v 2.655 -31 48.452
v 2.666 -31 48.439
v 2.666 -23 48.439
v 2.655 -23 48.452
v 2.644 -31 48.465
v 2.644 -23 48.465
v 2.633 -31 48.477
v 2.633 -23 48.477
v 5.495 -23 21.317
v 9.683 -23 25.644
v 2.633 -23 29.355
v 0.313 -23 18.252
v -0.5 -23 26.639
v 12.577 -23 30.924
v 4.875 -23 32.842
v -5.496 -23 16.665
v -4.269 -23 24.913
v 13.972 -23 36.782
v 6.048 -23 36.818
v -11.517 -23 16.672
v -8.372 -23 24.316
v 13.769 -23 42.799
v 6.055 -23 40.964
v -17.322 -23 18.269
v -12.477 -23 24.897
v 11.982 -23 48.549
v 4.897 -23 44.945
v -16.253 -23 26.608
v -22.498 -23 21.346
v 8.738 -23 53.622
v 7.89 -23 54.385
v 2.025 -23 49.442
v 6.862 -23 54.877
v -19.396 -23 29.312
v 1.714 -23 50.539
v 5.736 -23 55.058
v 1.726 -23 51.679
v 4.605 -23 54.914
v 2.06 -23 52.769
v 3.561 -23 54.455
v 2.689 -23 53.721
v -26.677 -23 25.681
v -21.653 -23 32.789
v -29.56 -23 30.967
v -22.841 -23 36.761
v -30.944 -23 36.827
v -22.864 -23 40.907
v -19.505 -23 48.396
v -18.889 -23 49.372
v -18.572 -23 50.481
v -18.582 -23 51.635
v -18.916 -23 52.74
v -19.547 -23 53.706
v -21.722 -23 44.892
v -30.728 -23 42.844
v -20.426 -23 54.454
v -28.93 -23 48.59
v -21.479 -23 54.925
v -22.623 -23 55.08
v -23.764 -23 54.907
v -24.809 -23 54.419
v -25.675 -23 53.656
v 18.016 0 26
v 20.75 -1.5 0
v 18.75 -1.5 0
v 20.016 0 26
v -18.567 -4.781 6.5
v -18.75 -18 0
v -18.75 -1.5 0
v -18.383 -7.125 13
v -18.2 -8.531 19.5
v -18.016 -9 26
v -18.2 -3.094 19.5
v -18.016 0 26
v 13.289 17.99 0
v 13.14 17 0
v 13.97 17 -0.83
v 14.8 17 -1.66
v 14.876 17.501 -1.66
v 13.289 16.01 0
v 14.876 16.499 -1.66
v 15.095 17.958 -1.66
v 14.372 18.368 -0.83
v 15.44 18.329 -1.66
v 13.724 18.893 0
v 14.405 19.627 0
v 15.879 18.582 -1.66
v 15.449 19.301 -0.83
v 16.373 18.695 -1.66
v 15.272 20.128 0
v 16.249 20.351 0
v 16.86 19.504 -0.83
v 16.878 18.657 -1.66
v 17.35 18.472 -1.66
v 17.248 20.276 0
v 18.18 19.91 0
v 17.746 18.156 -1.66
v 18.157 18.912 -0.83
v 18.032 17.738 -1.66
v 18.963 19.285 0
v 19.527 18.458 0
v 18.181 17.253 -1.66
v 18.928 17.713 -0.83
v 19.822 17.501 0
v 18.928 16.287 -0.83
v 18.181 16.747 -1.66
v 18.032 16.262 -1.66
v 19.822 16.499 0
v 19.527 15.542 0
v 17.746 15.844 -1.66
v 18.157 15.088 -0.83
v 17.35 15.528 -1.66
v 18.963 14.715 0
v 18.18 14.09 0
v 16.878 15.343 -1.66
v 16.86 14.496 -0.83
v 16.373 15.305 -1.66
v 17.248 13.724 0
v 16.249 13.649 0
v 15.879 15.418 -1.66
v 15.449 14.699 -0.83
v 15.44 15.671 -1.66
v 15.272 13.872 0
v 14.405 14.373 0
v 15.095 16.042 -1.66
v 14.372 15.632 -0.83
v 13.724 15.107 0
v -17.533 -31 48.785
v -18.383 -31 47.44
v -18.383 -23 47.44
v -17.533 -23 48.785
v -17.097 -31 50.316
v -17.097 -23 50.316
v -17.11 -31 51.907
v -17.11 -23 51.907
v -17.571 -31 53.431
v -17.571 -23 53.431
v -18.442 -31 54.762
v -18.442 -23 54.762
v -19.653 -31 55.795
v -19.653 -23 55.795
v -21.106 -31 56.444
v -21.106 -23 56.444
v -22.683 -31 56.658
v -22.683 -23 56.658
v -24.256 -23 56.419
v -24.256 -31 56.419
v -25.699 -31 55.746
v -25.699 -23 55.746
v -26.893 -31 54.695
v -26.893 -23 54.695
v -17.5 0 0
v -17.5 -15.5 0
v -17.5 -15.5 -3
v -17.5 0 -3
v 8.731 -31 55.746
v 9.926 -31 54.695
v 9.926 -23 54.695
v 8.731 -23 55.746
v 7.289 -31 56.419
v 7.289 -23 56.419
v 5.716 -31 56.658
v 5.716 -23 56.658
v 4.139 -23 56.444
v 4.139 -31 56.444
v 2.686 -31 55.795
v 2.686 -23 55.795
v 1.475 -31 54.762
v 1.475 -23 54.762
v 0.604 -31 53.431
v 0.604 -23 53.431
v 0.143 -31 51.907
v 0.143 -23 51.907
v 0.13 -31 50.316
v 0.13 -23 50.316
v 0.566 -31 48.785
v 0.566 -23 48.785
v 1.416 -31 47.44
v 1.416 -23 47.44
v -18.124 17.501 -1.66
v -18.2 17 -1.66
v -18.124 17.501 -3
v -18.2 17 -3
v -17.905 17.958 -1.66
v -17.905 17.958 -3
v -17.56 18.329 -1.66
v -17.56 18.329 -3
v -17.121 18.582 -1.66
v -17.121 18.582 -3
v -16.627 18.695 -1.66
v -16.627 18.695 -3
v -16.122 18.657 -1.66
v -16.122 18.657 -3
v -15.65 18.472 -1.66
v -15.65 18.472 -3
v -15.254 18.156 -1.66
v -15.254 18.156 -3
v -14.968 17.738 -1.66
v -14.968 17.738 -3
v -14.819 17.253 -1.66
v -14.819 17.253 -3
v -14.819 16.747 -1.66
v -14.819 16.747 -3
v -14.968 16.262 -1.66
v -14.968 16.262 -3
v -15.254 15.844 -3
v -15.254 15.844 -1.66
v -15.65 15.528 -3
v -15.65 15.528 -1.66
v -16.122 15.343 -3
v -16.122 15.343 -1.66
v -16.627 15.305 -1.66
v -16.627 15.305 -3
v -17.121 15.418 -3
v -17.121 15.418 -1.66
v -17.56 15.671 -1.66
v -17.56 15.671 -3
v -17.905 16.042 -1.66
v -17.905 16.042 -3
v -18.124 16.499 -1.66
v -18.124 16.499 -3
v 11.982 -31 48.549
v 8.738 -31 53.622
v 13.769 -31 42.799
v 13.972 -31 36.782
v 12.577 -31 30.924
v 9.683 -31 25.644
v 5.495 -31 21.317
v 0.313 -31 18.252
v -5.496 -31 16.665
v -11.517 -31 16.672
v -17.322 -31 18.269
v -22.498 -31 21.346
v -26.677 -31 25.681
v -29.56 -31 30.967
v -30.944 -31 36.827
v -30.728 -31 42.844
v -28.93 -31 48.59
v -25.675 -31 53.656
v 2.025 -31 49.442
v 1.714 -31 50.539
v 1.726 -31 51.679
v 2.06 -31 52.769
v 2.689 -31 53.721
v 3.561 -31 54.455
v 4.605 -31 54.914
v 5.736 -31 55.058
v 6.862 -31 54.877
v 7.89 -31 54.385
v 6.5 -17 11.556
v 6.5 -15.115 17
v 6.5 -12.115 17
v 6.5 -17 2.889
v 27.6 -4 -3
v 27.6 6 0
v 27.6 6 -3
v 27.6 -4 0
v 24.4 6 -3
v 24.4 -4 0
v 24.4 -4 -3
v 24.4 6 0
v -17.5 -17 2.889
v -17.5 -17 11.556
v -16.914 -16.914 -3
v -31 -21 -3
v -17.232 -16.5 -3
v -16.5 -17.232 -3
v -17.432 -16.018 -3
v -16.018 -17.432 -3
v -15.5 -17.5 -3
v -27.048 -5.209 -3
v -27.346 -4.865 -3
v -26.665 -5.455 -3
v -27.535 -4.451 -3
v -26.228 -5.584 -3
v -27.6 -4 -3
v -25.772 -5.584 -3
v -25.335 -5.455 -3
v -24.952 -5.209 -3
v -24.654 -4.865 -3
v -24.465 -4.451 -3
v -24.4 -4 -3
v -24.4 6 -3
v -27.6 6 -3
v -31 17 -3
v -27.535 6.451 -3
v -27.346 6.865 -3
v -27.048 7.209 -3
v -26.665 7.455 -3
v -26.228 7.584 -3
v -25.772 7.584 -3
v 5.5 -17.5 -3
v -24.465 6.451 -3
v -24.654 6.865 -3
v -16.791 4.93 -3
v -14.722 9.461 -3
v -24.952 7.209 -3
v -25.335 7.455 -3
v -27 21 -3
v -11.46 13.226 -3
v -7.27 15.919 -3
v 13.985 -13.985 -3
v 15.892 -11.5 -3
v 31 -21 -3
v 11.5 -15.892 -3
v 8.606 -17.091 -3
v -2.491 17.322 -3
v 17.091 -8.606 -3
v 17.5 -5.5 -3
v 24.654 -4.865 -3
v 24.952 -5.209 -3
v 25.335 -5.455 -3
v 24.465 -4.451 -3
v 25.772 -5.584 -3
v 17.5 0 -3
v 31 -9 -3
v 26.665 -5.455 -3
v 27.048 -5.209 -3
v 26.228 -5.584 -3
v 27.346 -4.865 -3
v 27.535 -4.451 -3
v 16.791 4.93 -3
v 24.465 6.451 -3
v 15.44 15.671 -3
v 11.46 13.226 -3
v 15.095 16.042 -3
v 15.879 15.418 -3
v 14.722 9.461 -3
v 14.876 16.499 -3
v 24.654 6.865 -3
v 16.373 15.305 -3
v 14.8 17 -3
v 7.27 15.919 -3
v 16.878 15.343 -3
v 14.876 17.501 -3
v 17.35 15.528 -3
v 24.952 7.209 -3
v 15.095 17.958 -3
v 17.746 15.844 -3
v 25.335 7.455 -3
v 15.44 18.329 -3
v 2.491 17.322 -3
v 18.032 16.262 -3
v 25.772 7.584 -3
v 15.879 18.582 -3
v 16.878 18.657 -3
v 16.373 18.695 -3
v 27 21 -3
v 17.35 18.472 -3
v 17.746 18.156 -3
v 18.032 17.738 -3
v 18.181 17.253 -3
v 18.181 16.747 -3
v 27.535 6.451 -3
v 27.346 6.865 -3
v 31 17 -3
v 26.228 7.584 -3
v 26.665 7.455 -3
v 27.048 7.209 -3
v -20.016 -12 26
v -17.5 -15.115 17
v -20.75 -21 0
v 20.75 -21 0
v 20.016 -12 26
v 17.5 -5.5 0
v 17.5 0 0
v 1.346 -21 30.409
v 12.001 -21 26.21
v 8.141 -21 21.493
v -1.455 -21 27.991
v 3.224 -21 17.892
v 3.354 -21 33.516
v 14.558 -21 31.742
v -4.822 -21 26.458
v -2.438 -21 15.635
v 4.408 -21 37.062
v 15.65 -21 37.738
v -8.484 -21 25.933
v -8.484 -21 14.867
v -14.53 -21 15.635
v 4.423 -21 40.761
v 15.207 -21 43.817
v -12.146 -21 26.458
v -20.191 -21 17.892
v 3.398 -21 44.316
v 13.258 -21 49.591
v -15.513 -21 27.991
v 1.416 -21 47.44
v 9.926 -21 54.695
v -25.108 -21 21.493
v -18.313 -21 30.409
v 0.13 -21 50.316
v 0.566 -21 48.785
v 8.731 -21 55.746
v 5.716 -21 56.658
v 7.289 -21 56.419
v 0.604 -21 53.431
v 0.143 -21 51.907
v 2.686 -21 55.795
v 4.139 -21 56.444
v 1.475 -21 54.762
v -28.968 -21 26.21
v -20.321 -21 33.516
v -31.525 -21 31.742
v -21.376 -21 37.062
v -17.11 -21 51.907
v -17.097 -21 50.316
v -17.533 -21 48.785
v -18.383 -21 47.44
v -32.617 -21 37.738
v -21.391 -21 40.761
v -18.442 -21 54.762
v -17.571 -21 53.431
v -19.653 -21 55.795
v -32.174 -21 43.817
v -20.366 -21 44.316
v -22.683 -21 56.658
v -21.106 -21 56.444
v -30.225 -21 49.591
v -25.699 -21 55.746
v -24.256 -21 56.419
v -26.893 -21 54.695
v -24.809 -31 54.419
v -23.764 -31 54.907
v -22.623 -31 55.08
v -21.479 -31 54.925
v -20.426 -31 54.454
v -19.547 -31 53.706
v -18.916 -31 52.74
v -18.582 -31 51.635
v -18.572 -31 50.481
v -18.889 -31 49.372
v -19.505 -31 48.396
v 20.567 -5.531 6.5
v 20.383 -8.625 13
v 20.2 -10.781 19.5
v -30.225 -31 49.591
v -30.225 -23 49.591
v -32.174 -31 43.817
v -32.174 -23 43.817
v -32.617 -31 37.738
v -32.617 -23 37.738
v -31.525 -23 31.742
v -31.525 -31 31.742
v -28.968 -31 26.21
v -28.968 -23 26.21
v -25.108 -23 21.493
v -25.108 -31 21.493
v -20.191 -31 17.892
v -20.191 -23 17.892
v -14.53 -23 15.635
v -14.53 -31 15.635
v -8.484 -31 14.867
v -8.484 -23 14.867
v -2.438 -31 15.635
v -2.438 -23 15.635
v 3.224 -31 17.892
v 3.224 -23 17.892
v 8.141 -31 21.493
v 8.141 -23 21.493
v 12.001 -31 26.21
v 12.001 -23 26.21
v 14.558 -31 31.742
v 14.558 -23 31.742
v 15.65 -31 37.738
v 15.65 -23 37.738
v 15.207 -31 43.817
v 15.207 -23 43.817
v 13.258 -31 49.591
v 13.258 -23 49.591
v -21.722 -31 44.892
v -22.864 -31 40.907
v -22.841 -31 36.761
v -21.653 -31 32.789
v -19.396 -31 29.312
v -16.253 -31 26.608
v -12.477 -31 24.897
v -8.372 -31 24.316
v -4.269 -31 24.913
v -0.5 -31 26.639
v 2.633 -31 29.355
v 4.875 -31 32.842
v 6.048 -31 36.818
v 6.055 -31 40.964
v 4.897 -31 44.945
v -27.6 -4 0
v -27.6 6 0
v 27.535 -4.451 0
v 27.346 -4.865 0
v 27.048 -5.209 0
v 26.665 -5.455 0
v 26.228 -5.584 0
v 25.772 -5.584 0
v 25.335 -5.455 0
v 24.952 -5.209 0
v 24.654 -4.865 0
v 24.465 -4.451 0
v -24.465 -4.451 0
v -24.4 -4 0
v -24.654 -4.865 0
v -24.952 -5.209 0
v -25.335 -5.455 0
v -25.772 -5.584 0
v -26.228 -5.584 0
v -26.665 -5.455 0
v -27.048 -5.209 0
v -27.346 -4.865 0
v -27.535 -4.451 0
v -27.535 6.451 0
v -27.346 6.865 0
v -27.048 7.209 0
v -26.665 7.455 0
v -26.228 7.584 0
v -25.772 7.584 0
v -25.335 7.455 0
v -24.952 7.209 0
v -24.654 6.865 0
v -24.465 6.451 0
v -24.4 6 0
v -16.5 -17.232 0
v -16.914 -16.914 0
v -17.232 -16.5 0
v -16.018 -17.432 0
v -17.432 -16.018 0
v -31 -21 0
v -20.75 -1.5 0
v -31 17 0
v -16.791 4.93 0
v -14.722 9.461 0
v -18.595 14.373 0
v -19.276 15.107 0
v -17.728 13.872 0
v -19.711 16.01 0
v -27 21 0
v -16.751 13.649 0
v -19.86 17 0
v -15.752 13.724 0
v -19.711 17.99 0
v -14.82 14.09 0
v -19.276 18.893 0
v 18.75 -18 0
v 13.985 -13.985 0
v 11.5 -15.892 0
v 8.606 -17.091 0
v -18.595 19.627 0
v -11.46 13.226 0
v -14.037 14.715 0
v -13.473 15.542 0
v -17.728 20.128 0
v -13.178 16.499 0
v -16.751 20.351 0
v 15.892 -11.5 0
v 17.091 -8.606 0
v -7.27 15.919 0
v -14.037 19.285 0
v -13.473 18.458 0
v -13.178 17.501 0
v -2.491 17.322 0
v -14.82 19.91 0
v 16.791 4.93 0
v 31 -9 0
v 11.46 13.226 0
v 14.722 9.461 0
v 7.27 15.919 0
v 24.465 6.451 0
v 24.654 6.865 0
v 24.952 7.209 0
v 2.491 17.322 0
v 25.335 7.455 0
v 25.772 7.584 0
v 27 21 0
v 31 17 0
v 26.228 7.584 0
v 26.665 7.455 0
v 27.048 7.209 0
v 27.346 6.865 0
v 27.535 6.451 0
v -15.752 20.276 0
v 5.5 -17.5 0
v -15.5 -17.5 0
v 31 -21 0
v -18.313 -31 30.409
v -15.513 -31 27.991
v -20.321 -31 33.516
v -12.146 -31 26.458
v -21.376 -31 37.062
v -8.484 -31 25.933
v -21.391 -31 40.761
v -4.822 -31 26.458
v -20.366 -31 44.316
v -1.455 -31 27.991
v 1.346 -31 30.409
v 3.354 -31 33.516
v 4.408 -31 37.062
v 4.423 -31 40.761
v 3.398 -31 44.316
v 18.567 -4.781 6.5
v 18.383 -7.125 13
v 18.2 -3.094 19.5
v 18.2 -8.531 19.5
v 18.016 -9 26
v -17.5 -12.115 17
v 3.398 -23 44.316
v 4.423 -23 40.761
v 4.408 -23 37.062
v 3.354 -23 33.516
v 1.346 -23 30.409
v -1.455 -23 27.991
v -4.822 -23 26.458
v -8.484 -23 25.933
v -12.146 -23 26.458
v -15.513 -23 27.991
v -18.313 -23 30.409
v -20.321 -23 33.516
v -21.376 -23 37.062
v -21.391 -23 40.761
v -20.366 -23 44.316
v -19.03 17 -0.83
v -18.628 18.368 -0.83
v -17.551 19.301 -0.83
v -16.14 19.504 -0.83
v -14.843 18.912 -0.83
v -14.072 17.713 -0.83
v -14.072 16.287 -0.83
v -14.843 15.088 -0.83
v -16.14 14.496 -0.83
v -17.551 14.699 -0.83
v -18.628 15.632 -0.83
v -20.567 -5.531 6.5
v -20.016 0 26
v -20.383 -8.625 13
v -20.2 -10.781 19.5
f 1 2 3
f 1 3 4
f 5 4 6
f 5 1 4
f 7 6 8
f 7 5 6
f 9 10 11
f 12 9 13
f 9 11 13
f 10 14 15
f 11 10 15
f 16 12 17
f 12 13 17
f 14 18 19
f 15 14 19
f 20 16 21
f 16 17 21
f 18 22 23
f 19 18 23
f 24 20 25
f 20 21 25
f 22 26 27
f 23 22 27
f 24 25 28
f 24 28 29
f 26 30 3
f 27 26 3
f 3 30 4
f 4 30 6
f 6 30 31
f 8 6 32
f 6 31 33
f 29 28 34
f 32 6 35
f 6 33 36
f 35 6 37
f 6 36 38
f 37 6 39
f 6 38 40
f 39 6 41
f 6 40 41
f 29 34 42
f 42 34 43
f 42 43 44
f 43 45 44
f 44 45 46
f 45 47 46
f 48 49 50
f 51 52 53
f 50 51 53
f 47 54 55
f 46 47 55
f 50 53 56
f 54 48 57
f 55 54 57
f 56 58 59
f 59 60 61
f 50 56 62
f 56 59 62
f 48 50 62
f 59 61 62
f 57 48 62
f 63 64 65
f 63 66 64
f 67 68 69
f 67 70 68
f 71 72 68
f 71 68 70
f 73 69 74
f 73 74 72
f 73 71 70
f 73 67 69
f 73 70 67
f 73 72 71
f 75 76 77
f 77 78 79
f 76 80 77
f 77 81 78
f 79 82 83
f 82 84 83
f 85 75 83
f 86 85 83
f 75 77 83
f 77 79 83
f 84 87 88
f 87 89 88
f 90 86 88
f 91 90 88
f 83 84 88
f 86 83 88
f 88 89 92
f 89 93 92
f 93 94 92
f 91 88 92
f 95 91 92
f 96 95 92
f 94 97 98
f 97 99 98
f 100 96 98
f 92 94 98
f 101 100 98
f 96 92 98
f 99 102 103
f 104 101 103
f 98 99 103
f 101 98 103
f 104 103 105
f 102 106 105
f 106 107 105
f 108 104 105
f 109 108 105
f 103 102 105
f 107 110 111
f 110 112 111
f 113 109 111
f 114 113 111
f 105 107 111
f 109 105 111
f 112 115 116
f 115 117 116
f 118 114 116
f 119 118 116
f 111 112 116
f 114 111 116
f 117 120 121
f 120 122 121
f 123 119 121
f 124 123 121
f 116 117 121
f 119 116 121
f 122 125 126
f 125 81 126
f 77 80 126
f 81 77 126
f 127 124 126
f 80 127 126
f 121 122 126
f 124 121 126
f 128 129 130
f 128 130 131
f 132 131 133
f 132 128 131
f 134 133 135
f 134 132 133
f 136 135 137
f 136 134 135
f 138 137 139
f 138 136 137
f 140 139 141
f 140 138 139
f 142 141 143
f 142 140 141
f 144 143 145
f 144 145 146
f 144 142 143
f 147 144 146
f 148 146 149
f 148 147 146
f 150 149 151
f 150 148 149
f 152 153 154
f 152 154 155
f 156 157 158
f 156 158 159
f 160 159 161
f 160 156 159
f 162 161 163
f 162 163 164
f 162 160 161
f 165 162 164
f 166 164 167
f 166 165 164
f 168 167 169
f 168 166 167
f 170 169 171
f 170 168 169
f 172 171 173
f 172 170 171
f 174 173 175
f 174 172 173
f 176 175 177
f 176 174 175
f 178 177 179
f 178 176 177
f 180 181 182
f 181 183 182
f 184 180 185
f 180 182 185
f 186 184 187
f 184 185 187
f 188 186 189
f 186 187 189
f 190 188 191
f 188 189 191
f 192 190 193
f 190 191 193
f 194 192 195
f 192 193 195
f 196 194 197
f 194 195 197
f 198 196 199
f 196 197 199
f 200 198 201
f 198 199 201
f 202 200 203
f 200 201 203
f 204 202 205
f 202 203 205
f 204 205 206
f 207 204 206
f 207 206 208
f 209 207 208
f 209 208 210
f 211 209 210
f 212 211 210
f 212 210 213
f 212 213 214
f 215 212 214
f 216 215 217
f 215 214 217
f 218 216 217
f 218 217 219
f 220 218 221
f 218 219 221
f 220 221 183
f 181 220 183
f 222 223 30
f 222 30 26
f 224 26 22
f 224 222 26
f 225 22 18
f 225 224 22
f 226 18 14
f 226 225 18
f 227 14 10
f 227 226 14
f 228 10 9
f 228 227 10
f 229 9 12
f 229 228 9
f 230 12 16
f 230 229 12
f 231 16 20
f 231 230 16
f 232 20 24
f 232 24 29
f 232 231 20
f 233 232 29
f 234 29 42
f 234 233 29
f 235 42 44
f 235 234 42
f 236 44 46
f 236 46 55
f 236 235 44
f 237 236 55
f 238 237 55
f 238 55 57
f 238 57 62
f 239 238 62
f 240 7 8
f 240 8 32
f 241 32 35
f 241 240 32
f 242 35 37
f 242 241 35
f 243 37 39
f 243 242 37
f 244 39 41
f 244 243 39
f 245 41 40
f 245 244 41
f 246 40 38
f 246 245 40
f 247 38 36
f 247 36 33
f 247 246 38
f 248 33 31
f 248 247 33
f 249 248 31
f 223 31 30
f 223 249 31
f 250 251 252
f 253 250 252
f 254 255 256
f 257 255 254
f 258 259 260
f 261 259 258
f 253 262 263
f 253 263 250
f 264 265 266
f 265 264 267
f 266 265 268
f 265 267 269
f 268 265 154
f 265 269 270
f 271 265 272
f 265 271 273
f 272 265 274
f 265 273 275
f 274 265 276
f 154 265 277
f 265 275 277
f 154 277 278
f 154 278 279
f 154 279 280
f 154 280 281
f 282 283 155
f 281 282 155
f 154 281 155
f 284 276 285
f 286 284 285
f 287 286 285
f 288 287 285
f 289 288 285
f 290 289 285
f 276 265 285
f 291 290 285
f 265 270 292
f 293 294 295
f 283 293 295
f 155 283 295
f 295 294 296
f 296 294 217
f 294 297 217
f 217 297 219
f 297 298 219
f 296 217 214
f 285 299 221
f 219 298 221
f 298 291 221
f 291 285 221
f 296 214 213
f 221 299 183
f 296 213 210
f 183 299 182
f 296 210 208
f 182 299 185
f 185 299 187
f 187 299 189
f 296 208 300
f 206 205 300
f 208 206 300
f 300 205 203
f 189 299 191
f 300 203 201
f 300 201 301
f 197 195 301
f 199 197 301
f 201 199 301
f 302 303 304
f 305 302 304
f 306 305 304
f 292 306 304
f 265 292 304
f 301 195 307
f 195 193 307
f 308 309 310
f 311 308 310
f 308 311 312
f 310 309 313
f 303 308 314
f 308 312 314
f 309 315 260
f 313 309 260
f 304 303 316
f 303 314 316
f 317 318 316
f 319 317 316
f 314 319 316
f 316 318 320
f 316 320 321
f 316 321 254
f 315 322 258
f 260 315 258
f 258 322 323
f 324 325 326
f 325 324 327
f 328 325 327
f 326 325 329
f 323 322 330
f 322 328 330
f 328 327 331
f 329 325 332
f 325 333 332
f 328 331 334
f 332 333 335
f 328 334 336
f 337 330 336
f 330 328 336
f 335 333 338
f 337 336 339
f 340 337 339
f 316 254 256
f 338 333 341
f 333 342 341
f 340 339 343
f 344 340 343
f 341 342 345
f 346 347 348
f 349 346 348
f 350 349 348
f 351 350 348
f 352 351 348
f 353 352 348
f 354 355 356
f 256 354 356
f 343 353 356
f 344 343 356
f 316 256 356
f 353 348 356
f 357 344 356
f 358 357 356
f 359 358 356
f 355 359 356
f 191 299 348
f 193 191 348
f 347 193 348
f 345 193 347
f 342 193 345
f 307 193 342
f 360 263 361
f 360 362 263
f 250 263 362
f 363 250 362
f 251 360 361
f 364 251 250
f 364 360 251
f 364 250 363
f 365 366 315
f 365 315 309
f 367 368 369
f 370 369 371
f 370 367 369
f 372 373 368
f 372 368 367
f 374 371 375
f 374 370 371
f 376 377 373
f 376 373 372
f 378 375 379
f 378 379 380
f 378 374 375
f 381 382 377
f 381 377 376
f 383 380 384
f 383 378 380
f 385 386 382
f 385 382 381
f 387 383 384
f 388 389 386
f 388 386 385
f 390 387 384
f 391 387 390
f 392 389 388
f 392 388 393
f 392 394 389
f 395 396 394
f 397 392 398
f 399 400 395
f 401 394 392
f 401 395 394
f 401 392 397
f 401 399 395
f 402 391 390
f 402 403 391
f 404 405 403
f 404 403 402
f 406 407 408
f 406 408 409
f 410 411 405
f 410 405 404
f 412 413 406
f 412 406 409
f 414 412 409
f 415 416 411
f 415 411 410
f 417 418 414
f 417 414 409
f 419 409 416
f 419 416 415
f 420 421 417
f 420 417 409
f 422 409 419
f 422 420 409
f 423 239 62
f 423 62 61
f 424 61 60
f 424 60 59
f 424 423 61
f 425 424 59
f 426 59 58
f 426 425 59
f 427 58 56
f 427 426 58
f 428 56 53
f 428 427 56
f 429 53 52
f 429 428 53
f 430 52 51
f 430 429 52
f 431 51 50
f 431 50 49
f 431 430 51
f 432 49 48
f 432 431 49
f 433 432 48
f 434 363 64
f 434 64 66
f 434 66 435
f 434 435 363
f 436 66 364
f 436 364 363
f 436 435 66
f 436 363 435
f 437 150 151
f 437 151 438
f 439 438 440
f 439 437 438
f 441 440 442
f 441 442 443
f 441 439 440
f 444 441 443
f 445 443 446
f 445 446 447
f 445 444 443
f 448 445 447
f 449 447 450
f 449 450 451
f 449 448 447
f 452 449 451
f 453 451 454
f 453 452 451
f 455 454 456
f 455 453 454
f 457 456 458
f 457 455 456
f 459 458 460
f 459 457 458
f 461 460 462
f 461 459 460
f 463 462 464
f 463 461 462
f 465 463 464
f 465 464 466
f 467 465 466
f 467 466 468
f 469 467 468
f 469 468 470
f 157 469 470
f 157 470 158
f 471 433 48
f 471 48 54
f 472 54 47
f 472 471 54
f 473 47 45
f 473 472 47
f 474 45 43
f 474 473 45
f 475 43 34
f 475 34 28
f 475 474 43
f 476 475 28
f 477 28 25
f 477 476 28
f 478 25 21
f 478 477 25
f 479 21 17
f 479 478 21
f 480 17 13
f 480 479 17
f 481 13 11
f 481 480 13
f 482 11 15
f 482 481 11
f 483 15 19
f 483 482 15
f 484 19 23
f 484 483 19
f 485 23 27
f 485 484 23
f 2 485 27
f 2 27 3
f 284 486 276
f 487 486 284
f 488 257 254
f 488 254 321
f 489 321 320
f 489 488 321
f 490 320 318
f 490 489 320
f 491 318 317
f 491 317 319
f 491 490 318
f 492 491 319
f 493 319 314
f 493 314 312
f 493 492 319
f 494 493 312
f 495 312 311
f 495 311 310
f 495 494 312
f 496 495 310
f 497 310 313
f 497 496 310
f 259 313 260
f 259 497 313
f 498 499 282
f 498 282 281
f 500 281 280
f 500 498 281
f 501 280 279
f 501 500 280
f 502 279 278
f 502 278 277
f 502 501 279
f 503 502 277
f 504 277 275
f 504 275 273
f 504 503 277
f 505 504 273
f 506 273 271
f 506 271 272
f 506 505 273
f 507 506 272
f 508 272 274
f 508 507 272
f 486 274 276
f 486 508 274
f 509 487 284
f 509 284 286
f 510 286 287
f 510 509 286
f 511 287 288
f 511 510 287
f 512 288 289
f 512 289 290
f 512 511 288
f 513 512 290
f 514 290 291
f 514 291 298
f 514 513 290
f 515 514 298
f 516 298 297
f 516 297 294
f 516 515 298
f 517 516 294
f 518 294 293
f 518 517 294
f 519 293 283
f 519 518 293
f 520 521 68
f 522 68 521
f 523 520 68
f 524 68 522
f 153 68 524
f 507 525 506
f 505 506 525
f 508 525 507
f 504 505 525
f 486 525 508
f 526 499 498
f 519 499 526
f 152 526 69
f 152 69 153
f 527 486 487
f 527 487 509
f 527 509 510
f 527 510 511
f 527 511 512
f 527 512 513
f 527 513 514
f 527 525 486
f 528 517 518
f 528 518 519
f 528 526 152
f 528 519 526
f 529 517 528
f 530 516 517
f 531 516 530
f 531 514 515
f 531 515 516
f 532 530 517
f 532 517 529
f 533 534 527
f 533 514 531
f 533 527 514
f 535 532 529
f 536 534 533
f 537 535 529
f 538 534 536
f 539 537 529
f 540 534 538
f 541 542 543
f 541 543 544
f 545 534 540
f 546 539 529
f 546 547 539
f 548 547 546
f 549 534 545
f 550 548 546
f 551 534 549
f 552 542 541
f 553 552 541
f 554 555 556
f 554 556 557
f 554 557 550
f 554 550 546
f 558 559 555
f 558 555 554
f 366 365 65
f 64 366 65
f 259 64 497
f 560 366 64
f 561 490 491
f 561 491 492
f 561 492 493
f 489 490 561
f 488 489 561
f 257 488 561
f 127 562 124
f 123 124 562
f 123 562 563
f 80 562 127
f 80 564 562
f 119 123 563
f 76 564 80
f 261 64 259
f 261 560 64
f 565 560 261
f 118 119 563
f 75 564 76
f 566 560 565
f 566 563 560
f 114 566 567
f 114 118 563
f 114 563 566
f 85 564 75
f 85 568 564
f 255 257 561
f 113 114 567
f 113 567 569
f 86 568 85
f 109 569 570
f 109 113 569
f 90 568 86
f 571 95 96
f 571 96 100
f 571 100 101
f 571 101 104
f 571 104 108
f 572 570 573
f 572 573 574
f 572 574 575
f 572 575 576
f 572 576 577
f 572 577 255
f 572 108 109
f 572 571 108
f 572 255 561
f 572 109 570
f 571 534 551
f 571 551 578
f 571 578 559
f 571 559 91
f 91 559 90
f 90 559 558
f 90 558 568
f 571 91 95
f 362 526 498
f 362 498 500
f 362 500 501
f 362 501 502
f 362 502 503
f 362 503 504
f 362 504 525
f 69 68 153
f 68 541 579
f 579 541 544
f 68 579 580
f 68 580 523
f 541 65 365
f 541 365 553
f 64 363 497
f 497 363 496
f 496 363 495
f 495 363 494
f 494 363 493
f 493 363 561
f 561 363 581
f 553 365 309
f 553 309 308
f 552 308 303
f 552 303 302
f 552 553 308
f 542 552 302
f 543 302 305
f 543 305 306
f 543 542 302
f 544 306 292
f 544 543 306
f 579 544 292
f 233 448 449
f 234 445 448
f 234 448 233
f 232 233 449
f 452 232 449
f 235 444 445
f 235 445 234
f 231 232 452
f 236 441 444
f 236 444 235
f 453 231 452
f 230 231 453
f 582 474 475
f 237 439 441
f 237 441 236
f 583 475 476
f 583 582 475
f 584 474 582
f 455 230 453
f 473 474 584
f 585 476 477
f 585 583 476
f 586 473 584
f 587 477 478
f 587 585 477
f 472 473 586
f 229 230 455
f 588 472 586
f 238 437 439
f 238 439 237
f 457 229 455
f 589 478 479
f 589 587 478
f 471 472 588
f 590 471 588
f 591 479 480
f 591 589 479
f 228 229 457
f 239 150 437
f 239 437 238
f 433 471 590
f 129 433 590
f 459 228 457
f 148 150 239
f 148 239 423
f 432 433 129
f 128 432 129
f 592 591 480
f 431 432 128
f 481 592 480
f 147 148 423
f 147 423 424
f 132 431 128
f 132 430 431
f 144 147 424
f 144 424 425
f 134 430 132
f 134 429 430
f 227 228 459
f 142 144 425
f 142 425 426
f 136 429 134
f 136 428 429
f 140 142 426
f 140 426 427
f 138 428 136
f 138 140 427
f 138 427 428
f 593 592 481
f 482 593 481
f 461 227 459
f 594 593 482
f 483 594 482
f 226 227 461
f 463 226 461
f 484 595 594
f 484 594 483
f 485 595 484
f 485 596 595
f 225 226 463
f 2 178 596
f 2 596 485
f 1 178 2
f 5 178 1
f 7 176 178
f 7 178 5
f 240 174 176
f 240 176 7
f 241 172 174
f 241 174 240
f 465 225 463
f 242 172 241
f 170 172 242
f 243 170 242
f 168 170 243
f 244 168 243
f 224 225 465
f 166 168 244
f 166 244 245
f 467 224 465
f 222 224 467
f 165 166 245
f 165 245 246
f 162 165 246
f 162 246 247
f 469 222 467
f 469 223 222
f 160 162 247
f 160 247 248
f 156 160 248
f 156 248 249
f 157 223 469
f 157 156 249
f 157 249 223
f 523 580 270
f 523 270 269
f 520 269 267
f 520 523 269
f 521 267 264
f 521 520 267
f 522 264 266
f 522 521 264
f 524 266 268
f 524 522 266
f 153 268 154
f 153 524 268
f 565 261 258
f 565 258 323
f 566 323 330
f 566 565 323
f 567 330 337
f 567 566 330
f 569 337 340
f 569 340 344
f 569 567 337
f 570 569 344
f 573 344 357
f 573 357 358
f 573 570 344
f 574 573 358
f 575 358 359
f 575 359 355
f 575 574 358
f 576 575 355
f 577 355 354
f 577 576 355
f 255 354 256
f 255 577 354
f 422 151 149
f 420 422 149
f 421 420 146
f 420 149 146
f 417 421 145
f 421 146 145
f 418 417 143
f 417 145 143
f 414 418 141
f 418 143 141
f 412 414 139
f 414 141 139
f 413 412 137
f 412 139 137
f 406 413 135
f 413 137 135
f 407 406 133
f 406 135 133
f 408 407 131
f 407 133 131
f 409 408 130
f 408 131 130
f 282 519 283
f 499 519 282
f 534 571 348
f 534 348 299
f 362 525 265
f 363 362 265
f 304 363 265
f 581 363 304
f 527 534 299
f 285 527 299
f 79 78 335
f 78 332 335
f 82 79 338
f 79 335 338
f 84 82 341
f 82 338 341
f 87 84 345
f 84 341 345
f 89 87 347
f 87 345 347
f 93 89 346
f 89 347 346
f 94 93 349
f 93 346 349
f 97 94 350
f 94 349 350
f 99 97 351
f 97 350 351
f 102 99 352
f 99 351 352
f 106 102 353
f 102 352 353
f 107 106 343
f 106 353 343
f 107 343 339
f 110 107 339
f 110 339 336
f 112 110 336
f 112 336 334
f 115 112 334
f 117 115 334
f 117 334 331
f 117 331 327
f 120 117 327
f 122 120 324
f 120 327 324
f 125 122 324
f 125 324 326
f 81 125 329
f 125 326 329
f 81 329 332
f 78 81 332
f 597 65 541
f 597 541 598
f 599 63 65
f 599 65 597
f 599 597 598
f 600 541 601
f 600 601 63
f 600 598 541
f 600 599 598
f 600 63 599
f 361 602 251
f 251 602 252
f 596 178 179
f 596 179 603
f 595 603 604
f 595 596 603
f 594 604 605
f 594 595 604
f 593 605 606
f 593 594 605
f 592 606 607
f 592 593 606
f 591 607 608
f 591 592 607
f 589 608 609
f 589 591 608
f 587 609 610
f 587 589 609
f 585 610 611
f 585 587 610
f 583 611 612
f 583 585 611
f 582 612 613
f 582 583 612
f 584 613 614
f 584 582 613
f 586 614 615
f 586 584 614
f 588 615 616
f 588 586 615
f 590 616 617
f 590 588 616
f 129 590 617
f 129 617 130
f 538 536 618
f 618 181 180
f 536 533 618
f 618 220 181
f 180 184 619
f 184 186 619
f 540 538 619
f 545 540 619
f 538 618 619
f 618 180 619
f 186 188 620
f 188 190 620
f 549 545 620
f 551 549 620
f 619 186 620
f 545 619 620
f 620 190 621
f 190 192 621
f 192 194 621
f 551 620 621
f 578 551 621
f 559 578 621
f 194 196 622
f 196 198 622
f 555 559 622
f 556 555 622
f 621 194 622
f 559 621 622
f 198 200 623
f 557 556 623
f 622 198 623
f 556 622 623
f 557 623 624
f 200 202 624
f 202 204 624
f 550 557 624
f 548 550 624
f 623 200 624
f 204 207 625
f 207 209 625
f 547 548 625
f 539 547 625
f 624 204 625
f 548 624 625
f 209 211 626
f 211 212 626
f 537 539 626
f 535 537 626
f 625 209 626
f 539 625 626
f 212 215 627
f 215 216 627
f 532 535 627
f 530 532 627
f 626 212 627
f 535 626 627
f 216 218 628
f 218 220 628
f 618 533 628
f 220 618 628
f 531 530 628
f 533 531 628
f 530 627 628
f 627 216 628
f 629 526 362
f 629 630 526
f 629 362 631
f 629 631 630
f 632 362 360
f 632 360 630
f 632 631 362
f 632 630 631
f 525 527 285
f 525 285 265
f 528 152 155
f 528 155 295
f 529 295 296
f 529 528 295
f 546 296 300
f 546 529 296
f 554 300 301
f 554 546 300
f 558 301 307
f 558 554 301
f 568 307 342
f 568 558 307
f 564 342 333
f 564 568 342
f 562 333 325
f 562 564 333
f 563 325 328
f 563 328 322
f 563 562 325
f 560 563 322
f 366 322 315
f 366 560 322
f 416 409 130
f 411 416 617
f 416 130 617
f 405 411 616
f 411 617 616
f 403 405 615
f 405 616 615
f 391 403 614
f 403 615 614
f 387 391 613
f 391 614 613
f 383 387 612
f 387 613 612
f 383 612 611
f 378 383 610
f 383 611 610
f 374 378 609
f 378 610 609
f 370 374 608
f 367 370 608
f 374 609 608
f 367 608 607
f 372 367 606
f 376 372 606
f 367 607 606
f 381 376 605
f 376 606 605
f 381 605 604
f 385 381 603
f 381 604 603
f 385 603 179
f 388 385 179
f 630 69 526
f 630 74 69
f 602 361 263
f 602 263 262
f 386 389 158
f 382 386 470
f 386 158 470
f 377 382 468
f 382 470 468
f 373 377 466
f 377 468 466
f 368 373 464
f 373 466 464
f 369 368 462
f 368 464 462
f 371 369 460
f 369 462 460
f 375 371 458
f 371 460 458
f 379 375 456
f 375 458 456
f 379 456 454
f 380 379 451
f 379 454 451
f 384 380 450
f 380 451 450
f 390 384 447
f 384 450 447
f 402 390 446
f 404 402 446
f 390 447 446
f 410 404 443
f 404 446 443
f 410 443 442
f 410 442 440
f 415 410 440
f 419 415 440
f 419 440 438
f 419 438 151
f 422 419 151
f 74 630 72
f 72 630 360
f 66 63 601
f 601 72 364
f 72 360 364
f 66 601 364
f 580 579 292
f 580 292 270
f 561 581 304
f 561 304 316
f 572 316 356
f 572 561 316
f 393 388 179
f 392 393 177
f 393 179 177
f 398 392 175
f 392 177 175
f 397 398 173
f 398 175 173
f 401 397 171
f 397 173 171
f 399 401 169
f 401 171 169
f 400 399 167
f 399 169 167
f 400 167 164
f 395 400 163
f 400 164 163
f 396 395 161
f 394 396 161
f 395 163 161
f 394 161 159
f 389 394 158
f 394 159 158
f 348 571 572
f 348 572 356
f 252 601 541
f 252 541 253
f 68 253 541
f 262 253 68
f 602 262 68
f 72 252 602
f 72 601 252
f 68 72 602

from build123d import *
from build123d import SkipClean  # not in build123d's __all__

# Parameters (mm, degrees)
F0_W           = 10
F0_H           = 12
F0_W_2         = 9.9836443961
F1_DEPTH       = 3
F2_D           = 3.4
F2_CSINK_D     = 6.72
F2_CSINK_ANGLE = 90
F3_SIZE        = 4
F9_W           = 24
F9_H           = 5
F10_DEPTH      = 15
F15_DEPTH      = 8
F17_DEPTH      = 2


# Not quite as in the source:
# - a feature names something its author has since deleted; it is built from what else it names


with BuildPart() as f1:
    # F0 (on Top) → F1 (new body)
    with BuildSketch(Plane.XY):
        with Locations((-26, -15)):
            Rectangle(F0_W, F0_H)
        with Locations((26.008177802, -15)):
            Rectangle(F0_W_2, F0_H)
        Polygon((31, 21), (-31, 21), (-31, -9), (-21, -9), (-21, -21), (21.0163556039, -21), (21.0163556039, -9), (31, -9), align=None)
        with BuildLine():
            ThreePointArc((-24.4, -4), (-26, -5.6), (-27.6, -4))
            Line((-27.6, -4), (-27.6, 6))
            ThreePointArc((-27.6, 6), (-26, 7.6), (-24.4, 6))
            Line((-24.4, 6), (-24.4, -4))
        make_face(mode=Mode.SUBTRACT)
        with BuildLine():
            ThreePointArc((-17.5, 0), (0, 17.5), (17.5, 0))
            Line((17.5, 0), (17.5, -5.5))
            ThreePointArc((17.5, -5.5), (13.9852813742, -13.9852813742), (5.5, -17.5))
            Line((5.5, -17.5), (-15.5, -17.5))
            ThreePointArc((-15.5, -17.5), (-16.9142135624, -16.9142135624), (-17.5, -15.5))
            Line((-17.5, -15.5), (-17.5, 0))
        make_face(mode=Mode.SUBTRACT)
        with BuildLine():
            ThreePointArc((27.6, -4), (26, -5.6), (24.4, -4))
            Line((24.4, -4), (24.4, 6))
            ThreePointArc((24.4, 6), (26, 7.6), (27.6, 6))
            Line((27.6, 6), (27.6, -4))
        make_face(mode=Mode.SUBTRACT)
    extrude(amount=-F1_DEPTH)

    # F2 (through all)
    with Locations(Plane.XY):
        with Locations((-16.5, 17), (16.5, 17)):
            CounterSinkHole(F2_D / 2, F2_CSINK_D / 2, counter_sink_angle=F2_CSINK_ANGLE)

    # F3
    f3_edges = [f1.edges().sort_by_distance(p)[0] for p in [
        (31, 21, -1.5),
        (-31, 21, -1.5),
    ]]
    chamfer(f3_edges, length=F3_SIZE)

    # F4 (on face) → F7 section 0
    with BuildSketch(Plane.XY):
        Polygon((-18.75, -1.5), (-20.75, -1.5), (-20.75, -21), (20.75, -21), (20.75, -1.5), (18.75, -1.5), (18.75, -18), (-18.75, -18), align=None)
    # F6 (on offset) → F7 section 1
    with BuildSketch(Plane.XY.offset(26)):
        Polygon((-20.0163556039, 0), (-20.0163556039, -12), (20.0163556039, -12), (20.0163556039, 0), (18.0163556039, 0), (18.0163556039, -9), (-18.0163556039, -9), (-18.0163556039, 0), align=None)
    loft()

    # F9 (on offset) → F10 (cut)
    with BuildSketch(Plane.XY.offset(2)):
        with Locations((-5.5, -14.5)):
            Rectangle(F9_W, F9_H)
    extrude(amount=F10_DEPTH, mode=Mode.SUBTRACT)


with BuildPart() as f15:
    # F13 (on offset) → F15 (new body)
    with BuildSketch(Plane.XZ.offset(31)):
        with BuildLine():
            ThreePointArc((-18.3830856085, 47.4395647135), (-19.0105652692, 55.3219802644), (-26.8929808201, 54.6945006036))
            ThreePointArc((-26.8929808201, 54.6945006036), (-8.4836443961, 14.8667804257), (9.9256920279, 54.6945006036))
            ThreePointArc((9.9256920279, 54.6945006036), (2.0432764771, 55.3219802644), (1.4157968163, 47.4395647135))
            ThreePointArc((1.4157968163, 47.4395647135), (-8.4836443961, 25.9331770523), (-18.3830856085, 47.4395647135))
        make_face()
        with BuildLine():
            ThreePointArc((8.7375378537, 53.6218026281), (-8.5063834027, 16.4667918811), (-25.6753981826, 53.6564756038))
            ThreePointArc((-25.6753981826, 53.6564756038), (-19.959761381, 54.1114688502), (-19.5047681345, 48.3958320486))
            ThreePointArc((-19.5047681345, 48.3958320486), (-8.3719987512, 24.316495823), (2.666209427, 48.439326242))
            ThreePointArc((2.666209427, 48.439326242), (2.6497503397, 48.4584205612), (2.6332583079, 48.4774864329))
            ThreePointArc((2.6332583079, 48.4774864329), (3.0985445837, 54.1192219614), (8.7375378537, 53.6218026281))
        make_face(mode=Mode.SUBTRACT)
    extrude(amount=-F15_DEPTH)

    # F16 (on face) → F17 (join)
    with BuildSketch(Plane(origin=(0, -23, 0), x_dir=(-1, 0, 0), z_dir=(0, 1, 0))):
        with BuildLine():
            ThreePointArc((26.8929808201, 54.6945006036), (19.0105652692, 55.3219802644), (18.3830856085, 47.4395647135))
            ThreePointArc((18.3830856085, 47.4395647135), (8.4836443961, 25.9331770523), (-1.4157968163, 47.4395647135))
            ThreePointArc((-1.4157968163, 47.4395647135), (-2.0432764771, 55.3219802644), (-9.9256920279, 54.6945006036))
            ThreePointArc((-9.9256920279, 54.6945006036), (8.4836443961, 14.8667804257), (26.8929808201, 54.6945006036))
        make_face()
    with SkipClean():  # cleaning this boolean's faces spoils the solid; the shape is the same uncleaned
        extrude(amount=F17_DEPTH)


solid = Compound([f1.part, f15.part])
